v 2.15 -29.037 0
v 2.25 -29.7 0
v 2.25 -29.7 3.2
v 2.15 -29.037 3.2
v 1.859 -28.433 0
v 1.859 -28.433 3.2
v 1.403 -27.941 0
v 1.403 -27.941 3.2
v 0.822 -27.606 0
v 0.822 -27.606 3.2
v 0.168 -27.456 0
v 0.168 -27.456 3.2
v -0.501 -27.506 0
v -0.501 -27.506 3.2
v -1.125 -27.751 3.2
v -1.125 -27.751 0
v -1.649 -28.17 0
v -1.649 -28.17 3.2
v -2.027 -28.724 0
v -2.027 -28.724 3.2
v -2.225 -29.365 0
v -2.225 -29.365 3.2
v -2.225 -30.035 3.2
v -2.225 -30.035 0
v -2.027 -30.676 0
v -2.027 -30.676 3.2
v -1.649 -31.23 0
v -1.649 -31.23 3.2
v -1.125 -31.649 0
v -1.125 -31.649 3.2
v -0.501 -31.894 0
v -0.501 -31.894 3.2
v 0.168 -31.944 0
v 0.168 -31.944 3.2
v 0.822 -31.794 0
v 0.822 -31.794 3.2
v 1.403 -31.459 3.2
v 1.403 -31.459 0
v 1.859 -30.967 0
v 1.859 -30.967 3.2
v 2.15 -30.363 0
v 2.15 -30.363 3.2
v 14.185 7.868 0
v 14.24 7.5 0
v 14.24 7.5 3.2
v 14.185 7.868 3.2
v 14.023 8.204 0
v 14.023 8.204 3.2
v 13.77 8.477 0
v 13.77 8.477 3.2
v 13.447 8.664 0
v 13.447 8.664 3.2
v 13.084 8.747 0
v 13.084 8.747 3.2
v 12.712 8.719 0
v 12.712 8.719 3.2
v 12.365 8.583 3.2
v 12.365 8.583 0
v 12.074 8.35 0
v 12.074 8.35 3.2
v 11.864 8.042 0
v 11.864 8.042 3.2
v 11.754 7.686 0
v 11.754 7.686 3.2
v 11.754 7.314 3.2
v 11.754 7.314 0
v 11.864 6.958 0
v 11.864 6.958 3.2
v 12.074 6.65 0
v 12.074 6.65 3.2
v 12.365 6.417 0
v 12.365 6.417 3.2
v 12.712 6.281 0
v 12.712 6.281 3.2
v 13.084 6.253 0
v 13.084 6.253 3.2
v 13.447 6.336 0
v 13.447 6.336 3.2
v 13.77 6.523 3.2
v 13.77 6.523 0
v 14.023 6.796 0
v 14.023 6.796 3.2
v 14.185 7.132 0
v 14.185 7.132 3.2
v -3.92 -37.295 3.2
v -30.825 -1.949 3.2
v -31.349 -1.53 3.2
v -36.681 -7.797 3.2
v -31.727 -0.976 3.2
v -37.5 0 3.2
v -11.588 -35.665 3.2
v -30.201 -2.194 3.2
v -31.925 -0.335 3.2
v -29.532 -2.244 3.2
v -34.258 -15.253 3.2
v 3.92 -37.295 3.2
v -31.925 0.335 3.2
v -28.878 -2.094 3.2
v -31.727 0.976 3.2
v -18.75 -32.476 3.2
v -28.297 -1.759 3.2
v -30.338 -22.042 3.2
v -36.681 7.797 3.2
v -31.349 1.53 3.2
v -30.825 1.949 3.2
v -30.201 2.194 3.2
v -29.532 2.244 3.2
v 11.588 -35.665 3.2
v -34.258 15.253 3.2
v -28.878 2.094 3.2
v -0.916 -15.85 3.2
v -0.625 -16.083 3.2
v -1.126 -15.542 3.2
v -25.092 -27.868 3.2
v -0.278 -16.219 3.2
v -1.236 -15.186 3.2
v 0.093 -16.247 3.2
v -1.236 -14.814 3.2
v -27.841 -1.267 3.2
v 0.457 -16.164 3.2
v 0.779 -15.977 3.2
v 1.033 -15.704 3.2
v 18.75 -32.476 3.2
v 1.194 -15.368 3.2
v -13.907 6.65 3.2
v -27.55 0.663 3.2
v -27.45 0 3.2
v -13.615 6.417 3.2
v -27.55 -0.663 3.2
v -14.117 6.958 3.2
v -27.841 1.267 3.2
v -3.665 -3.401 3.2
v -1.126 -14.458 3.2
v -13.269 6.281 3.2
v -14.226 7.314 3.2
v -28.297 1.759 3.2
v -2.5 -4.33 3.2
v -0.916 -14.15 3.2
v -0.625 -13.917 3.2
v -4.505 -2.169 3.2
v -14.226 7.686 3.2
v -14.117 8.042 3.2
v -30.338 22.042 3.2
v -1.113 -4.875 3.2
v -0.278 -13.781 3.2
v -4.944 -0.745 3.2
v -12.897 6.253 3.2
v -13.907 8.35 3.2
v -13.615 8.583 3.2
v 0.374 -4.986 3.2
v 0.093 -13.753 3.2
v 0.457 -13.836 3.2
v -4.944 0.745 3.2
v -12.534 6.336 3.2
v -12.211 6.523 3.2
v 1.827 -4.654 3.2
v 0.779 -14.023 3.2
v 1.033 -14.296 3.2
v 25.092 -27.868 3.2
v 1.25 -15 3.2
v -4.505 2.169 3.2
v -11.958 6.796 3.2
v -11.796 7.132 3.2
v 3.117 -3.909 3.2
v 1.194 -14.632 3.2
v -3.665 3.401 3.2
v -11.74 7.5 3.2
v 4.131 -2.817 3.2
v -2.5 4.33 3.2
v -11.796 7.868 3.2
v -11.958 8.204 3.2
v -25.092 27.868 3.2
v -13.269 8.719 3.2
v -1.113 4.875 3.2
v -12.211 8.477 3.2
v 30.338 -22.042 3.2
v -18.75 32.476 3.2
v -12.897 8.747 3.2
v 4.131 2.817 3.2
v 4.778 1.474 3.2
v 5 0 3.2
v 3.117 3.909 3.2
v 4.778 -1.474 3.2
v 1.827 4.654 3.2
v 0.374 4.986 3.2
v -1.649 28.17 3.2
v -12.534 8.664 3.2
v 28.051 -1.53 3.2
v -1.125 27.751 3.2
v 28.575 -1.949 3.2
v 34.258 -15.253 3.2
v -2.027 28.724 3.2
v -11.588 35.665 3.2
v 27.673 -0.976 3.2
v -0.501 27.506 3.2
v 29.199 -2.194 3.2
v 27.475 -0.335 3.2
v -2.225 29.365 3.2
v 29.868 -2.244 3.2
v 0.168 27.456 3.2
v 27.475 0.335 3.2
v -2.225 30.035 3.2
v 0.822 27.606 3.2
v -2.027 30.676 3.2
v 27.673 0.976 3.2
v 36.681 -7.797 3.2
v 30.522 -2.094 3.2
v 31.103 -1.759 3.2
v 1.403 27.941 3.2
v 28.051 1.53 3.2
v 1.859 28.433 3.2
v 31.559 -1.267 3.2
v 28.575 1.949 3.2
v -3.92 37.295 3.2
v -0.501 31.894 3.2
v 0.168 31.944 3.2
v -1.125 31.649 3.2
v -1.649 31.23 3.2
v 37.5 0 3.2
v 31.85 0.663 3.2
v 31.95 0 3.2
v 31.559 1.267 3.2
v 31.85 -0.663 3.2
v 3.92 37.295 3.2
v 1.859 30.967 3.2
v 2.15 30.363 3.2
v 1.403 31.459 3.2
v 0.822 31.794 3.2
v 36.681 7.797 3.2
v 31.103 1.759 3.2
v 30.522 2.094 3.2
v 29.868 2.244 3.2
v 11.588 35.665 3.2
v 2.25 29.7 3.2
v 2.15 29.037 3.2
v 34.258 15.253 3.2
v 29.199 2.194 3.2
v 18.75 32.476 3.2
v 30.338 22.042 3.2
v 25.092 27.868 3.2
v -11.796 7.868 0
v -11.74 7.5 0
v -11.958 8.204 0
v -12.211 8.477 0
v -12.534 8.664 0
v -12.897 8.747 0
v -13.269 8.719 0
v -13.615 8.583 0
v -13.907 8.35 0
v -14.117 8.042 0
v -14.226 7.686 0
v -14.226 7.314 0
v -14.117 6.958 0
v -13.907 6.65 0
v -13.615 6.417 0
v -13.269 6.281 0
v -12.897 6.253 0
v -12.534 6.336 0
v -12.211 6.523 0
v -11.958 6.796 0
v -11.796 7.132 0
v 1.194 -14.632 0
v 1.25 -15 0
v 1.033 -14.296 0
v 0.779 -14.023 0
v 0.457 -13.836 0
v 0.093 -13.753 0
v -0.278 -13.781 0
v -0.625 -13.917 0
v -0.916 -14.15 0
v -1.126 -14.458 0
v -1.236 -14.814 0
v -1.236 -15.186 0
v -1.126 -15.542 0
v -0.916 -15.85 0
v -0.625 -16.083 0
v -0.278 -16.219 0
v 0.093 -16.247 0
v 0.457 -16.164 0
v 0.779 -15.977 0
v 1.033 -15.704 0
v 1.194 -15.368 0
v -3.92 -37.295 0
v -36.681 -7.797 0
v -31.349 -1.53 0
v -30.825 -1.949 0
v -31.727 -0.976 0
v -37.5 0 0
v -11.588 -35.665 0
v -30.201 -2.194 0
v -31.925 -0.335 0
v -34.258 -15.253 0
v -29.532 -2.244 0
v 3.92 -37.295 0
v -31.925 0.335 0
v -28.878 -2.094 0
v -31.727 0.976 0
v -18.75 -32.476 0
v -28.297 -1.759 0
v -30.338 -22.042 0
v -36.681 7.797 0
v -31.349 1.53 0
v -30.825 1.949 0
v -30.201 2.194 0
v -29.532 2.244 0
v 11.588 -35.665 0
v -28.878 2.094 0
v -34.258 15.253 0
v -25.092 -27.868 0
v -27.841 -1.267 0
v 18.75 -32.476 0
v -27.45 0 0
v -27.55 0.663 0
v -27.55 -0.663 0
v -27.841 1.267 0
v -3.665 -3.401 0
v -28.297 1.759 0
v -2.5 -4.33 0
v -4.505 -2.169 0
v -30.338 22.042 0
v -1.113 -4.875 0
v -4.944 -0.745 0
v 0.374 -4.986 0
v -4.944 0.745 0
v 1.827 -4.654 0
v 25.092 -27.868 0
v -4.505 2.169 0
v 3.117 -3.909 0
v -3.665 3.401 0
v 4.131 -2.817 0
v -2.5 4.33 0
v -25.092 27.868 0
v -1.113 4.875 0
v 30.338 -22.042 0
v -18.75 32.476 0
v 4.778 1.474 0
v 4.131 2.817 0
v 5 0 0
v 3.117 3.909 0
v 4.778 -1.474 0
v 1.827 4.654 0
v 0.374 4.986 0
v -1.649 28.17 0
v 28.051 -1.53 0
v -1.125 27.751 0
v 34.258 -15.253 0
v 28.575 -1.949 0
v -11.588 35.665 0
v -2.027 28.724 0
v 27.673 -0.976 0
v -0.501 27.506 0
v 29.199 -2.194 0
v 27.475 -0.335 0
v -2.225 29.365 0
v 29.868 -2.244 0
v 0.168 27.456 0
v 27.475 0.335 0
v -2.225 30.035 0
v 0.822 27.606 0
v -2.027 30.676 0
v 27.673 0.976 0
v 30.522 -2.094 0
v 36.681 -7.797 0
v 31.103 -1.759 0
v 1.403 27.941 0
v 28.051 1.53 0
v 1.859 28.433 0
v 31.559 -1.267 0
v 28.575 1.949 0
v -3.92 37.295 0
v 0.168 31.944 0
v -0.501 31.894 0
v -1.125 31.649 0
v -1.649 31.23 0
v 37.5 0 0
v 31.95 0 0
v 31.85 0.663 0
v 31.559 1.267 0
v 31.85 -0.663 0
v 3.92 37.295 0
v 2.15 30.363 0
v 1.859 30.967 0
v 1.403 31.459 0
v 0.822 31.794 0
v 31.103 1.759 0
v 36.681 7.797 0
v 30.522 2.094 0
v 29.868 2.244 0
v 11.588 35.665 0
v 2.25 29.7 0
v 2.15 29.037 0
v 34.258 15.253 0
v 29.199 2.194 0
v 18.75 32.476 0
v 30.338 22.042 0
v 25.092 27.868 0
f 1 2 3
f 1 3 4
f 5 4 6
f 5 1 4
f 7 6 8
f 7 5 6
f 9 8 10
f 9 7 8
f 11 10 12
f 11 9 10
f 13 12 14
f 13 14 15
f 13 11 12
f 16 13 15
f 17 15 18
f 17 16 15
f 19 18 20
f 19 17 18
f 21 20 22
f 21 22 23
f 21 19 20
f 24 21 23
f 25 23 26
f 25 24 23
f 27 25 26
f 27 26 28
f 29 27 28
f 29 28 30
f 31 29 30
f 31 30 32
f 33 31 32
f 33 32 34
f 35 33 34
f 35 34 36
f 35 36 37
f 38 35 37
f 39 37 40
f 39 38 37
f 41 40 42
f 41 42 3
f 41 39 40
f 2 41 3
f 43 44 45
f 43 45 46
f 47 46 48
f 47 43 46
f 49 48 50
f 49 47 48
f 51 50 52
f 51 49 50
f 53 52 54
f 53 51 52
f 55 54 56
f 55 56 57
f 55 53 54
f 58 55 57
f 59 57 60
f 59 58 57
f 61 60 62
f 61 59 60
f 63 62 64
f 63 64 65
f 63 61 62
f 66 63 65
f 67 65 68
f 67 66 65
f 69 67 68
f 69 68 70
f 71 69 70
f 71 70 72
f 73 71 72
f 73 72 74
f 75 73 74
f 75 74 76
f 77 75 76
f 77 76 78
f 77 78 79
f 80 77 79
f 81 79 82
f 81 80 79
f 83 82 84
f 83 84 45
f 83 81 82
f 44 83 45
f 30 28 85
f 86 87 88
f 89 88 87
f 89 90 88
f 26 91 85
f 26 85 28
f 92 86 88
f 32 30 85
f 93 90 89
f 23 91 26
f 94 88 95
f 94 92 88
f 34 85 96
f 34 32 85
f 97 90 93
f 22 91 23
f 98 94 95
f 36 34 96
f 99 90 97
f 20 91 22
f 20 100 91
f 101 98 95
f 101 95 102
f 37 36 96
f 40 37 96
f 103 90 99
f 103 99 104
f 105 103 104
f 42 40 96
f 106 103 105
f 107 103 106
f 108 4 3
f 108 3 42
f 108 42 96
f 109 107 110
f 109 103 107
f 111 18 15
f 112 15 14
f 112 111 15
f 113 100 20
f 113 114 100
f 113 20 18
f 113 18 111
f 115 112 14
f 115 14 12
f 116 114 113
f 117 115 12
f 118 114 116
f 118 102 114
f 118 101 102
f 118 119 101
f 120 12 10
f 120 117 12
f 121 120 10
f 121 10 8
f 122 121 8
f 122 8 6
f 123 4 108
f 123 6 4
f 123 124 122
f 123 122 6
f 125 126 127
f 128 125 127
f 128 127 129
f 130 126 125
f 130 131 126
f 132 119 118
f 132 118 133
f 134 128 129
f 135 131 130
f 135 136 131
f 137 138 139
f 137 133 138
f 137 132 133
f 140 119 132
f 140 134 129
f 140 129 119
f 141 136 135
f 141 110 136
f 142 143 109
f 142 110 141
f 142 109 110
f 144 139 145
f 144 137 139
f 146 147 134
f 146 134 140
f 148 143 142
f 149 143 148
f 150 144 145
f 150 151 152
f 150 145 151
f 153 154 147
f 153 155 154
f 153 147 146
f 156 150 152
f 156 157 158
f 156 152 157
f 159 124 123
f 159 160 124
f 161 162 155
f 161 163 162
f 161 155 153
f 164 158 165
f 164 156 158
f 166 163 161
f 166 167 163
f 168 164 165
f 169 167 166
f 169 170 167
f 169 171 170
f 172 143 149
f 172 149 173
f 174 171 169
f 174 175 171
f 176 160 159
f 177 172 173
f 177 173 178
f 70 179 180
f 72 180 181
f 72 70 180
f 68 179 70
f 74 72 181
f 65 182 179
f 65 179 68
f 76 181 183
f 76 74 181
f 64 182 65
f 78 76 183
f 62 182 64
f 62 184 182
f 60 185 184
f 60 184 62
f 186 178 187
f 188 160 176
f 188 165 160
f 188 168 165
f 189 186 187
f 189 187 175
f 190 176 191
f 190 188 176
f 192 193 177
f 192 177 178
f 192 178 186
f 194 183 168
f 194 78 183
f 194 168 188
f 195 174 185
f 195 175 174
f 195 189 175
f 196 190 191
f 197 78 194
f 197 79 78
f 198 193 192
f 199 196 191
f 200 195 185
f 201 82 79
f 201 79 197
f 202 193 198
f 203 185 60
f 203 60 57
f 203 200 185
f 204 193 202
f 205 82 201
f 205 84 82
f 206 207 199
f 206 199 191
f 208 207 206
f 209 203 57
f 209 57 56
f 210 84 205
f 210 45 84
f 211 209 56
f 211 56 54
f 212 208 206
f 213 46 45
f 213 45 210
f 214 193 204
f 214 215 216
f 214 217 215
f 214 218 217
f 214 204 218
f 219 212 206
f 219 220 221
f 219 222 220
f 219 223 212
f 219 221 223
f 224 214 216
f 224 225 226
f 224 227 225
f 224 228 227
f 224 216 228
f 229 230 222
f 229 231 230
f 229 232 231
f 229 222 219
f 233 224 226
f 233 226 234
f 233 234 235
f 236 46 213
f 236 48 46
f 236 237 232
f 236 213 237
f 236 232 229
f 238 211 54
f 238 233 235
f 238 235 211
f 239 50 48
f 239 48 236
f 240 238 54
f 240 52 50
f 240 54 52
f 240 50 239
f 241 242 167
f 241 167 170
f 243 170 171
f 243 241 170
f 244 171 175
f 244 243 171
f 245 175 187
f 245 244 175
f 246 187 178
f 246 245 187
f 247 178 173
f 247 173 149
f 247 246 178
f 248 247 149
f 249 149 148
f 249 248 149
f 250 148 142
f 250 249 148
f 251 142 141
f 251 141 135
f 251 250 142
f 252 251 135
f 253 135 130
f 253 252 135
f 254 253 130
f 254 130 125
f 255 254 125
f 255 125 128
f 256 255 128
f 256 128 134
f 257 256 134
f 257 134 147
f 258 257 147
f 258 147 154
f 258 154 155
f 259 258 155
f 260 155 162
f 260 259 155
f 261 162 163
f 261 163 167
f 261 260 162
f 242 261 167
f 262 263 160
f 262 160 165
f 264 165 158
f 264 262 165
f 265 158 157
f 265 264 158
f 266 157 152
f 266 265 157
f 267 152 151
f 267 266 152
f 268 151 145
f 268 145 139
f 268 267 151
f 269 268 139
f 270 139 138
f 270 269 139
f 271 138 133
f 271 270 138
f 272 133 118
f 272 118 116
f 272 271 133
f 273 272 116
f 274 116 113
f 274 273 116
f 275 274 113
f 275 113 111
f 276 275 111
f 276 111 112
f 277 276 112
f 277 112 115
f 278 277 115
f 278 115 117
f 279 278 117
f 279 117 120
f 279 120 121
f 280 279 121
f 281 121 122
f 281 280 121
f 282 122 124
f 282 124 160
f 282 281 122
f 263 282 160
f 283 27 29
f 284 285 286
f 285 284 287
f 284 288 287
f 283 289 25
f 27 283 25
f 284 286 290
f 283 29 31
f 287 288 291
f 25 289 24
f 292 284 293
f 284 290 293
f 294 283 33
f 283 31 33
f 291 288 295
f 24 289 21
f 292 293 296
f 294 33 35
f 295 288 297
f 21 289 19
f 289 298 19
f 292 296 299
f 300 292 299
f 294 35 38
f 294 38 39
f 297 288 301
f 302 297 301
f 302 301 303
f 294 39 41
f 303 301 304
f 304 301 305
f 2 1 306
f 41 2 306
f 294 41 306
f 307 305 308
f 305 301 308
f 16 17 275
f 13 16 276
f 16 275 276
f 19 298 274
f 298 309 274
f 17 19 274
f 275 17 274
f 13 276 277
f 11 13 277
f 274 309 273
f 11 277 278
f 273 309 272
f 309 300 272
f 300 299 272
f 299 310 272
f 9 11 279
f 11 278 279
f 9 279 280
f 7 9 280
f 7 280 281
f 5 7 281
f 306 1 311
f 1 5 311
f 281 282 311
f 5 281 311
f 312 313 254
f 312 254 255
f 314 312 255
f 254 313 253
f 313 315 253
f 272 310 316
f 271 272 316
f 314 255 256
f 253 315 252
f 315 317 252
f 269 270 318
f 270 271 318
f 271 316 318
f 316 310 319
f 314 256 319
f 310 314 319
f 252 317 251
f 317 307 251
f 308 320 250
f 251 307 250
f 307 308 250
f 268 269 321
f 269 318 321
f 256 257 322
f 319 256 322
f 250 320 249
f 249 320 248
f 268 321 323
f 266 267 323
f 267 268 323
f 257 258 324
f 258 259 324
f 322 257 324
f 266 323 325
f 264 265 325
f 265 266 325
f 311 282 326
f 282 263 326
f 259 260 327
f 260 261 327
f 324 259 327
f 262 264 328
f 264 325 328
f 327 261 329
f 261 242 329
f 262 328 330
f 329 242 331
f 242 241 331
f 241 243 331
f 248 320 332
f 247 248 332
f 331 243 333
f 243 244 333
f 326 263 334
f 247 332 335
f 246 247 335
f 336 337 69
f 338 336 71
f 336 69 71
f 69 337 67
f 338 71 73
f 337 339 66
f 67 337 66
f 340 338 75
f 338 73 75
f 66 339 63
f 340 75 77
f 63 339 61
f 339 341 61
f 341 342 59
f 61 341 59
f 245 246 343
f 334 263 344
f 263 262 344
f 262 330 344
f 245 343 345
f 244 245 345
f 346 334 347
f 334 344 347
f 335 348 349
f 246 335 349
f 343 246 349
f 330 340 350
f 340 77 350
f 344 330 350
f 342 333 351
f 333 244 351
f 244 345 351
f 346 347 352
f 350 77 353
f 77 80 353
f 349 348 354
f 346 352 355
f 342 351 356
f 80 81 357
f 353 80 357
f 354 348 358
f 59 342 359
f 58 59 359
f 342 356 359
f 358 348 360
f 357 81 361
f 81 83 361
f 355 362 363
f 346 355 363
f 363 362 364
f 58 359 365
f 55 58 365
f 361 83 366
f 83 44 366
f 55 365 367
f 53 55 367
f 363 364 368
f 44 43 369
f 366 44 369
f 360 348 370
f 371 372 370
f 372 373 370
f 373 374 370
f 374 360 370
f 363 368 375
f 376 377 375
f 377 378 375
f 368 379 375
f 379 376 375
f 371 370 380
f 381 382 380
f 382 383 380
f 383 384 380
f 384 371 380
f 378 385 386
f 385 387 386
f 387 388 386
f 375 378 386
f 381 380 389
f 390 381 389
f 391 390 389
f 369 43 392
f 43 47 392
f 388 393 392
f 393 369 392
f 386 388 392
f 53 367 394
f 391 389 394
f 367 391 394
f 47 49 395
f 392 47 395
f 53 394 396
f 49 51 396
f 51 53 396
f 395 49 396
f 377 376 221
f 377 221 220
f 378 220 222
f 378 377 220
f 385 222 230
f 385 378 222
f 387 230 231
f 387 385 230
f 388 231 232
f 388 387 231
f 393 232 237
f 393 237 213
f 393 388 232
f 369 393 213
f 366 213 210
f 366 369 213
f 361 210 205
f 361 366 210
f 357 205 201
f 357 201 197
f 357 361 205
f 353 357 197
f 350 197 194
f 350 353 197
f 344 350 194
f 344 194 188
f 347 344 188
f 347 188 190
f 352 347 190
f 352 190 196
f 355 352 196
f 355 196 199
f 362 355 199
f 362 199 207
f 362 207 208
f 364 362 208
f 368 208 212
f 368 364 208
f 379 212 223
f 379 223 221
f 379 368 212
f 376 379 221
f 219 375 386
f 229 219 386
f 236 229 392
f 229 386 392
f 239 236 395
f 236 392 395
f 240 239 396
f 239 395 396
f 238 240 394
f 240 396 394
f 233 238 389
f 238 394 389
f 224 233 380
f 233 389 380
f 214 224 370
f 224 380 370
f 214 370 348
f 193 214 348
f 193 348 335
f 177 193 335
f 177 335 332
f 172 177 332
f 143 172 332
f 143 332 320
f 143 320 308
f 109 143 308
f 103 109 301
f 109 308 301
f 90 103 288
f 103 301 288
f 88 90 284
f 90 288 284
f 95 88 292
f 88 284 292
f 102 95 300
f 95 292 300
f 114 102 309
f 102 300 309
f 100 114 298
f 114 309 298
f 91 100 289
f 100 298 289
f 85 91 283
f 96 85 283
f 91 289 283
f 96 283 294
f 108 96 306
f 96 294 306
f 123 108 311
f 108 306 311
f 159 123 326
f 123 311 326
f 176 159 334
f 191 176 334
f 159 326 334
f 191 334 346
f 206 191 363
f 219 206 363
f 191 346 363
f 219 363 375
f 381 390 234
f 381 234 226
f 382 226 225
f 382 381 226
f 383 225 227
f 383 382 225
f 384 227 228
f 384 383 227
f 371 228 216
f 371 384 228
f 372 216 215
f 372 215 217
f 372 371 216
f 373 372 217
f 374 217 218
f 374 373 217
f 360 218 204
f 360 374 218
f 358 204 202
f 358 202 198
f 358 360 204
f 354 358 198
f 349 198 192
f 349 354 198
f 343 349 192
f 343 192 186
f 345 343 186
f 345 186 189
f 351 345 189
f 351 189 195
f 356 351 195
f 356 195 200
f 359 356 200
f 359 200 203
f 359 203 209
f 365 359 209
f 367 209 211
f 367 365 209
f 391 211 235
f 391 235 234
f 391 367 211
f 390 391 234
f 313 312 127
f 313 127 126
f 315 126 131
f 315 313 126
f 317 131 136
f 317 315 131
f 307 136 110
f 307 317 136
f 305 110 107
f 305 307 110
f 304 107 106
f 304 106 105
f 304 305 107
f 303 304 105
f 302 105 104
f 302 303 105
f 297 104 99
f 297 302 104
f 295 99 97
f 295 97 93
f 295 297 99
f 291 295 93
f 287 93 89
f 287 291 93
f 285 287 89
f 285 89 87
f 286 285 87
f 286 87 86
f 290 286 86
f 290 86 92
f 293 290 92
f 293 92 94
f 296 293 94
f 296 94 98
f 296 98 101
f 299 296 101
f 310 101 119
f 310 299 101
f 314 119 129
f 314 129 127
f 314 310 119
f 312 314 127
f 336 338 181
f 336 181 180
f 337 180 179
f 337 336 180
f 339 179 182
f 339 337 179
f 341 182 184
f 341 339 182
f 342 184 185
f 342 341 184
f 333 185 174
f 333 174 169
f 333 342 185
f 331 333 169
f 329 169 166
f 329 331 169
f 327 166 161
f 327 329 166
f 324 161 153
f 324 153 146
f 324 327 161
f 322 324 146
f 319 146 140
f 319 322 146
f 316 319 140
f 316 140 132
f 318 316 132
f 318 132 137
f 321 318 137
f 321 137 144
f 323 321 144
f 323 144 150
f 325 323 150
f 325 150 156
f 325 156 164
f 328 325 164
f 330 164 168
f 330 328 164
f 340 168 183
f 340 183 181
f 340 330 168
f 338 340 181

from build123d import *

# Parameters (mm, degrees)
SKETCH1_R           = 37.5
SKETCH1_R_2         = 2.25
SKETCH1_R_3         = 5
SKETCH1_R_4         = 1.25
BOSS_EXTRUDE1_DEPTH = 3.2


with BuildPart() as part:
    # Sketch1 → Boss-Extrude1 (new body)
    with BuildSketch(Plane.XY):
        Circle(SKETCH1_R)
        with Locations((0, 29.7)):
            Circle(SKETCH1_R_2, mode=Mode.SUBTRACT)
        Circle(SKETCH1_R_3, mode=Mode.SUBTRACT)
        with Locations((29.7, 0)):
            Circle(SKETCH1_R_2, mode=Mode.SUBTRACT)
        with Locations((0, -29.7)):
            Circle(SKETCH1_R_2, mode=Mode.SUBTRACT)
        with Locations((-29.7, 0)):
            Circle(SKETCH1_R_2, mode=Mode.SUBTRACT)
        with Locations((-12.990381057, 7.5)):
            Circle(SKETCH1_R_4, mode=Mode.SUBTRACT)
        with Locations((12.990381057, 7.5)):
            Circle(SKETCH1_R_4, mode=Mode.SUBTRACT)
        with Locations((0, -15)):
            Circle(SKETCH1_R_4, mode=Mode.SUBTRACT)
    extrude(amount=BOSS_EXTRUDE1_DEPTH)


solid = part.part
